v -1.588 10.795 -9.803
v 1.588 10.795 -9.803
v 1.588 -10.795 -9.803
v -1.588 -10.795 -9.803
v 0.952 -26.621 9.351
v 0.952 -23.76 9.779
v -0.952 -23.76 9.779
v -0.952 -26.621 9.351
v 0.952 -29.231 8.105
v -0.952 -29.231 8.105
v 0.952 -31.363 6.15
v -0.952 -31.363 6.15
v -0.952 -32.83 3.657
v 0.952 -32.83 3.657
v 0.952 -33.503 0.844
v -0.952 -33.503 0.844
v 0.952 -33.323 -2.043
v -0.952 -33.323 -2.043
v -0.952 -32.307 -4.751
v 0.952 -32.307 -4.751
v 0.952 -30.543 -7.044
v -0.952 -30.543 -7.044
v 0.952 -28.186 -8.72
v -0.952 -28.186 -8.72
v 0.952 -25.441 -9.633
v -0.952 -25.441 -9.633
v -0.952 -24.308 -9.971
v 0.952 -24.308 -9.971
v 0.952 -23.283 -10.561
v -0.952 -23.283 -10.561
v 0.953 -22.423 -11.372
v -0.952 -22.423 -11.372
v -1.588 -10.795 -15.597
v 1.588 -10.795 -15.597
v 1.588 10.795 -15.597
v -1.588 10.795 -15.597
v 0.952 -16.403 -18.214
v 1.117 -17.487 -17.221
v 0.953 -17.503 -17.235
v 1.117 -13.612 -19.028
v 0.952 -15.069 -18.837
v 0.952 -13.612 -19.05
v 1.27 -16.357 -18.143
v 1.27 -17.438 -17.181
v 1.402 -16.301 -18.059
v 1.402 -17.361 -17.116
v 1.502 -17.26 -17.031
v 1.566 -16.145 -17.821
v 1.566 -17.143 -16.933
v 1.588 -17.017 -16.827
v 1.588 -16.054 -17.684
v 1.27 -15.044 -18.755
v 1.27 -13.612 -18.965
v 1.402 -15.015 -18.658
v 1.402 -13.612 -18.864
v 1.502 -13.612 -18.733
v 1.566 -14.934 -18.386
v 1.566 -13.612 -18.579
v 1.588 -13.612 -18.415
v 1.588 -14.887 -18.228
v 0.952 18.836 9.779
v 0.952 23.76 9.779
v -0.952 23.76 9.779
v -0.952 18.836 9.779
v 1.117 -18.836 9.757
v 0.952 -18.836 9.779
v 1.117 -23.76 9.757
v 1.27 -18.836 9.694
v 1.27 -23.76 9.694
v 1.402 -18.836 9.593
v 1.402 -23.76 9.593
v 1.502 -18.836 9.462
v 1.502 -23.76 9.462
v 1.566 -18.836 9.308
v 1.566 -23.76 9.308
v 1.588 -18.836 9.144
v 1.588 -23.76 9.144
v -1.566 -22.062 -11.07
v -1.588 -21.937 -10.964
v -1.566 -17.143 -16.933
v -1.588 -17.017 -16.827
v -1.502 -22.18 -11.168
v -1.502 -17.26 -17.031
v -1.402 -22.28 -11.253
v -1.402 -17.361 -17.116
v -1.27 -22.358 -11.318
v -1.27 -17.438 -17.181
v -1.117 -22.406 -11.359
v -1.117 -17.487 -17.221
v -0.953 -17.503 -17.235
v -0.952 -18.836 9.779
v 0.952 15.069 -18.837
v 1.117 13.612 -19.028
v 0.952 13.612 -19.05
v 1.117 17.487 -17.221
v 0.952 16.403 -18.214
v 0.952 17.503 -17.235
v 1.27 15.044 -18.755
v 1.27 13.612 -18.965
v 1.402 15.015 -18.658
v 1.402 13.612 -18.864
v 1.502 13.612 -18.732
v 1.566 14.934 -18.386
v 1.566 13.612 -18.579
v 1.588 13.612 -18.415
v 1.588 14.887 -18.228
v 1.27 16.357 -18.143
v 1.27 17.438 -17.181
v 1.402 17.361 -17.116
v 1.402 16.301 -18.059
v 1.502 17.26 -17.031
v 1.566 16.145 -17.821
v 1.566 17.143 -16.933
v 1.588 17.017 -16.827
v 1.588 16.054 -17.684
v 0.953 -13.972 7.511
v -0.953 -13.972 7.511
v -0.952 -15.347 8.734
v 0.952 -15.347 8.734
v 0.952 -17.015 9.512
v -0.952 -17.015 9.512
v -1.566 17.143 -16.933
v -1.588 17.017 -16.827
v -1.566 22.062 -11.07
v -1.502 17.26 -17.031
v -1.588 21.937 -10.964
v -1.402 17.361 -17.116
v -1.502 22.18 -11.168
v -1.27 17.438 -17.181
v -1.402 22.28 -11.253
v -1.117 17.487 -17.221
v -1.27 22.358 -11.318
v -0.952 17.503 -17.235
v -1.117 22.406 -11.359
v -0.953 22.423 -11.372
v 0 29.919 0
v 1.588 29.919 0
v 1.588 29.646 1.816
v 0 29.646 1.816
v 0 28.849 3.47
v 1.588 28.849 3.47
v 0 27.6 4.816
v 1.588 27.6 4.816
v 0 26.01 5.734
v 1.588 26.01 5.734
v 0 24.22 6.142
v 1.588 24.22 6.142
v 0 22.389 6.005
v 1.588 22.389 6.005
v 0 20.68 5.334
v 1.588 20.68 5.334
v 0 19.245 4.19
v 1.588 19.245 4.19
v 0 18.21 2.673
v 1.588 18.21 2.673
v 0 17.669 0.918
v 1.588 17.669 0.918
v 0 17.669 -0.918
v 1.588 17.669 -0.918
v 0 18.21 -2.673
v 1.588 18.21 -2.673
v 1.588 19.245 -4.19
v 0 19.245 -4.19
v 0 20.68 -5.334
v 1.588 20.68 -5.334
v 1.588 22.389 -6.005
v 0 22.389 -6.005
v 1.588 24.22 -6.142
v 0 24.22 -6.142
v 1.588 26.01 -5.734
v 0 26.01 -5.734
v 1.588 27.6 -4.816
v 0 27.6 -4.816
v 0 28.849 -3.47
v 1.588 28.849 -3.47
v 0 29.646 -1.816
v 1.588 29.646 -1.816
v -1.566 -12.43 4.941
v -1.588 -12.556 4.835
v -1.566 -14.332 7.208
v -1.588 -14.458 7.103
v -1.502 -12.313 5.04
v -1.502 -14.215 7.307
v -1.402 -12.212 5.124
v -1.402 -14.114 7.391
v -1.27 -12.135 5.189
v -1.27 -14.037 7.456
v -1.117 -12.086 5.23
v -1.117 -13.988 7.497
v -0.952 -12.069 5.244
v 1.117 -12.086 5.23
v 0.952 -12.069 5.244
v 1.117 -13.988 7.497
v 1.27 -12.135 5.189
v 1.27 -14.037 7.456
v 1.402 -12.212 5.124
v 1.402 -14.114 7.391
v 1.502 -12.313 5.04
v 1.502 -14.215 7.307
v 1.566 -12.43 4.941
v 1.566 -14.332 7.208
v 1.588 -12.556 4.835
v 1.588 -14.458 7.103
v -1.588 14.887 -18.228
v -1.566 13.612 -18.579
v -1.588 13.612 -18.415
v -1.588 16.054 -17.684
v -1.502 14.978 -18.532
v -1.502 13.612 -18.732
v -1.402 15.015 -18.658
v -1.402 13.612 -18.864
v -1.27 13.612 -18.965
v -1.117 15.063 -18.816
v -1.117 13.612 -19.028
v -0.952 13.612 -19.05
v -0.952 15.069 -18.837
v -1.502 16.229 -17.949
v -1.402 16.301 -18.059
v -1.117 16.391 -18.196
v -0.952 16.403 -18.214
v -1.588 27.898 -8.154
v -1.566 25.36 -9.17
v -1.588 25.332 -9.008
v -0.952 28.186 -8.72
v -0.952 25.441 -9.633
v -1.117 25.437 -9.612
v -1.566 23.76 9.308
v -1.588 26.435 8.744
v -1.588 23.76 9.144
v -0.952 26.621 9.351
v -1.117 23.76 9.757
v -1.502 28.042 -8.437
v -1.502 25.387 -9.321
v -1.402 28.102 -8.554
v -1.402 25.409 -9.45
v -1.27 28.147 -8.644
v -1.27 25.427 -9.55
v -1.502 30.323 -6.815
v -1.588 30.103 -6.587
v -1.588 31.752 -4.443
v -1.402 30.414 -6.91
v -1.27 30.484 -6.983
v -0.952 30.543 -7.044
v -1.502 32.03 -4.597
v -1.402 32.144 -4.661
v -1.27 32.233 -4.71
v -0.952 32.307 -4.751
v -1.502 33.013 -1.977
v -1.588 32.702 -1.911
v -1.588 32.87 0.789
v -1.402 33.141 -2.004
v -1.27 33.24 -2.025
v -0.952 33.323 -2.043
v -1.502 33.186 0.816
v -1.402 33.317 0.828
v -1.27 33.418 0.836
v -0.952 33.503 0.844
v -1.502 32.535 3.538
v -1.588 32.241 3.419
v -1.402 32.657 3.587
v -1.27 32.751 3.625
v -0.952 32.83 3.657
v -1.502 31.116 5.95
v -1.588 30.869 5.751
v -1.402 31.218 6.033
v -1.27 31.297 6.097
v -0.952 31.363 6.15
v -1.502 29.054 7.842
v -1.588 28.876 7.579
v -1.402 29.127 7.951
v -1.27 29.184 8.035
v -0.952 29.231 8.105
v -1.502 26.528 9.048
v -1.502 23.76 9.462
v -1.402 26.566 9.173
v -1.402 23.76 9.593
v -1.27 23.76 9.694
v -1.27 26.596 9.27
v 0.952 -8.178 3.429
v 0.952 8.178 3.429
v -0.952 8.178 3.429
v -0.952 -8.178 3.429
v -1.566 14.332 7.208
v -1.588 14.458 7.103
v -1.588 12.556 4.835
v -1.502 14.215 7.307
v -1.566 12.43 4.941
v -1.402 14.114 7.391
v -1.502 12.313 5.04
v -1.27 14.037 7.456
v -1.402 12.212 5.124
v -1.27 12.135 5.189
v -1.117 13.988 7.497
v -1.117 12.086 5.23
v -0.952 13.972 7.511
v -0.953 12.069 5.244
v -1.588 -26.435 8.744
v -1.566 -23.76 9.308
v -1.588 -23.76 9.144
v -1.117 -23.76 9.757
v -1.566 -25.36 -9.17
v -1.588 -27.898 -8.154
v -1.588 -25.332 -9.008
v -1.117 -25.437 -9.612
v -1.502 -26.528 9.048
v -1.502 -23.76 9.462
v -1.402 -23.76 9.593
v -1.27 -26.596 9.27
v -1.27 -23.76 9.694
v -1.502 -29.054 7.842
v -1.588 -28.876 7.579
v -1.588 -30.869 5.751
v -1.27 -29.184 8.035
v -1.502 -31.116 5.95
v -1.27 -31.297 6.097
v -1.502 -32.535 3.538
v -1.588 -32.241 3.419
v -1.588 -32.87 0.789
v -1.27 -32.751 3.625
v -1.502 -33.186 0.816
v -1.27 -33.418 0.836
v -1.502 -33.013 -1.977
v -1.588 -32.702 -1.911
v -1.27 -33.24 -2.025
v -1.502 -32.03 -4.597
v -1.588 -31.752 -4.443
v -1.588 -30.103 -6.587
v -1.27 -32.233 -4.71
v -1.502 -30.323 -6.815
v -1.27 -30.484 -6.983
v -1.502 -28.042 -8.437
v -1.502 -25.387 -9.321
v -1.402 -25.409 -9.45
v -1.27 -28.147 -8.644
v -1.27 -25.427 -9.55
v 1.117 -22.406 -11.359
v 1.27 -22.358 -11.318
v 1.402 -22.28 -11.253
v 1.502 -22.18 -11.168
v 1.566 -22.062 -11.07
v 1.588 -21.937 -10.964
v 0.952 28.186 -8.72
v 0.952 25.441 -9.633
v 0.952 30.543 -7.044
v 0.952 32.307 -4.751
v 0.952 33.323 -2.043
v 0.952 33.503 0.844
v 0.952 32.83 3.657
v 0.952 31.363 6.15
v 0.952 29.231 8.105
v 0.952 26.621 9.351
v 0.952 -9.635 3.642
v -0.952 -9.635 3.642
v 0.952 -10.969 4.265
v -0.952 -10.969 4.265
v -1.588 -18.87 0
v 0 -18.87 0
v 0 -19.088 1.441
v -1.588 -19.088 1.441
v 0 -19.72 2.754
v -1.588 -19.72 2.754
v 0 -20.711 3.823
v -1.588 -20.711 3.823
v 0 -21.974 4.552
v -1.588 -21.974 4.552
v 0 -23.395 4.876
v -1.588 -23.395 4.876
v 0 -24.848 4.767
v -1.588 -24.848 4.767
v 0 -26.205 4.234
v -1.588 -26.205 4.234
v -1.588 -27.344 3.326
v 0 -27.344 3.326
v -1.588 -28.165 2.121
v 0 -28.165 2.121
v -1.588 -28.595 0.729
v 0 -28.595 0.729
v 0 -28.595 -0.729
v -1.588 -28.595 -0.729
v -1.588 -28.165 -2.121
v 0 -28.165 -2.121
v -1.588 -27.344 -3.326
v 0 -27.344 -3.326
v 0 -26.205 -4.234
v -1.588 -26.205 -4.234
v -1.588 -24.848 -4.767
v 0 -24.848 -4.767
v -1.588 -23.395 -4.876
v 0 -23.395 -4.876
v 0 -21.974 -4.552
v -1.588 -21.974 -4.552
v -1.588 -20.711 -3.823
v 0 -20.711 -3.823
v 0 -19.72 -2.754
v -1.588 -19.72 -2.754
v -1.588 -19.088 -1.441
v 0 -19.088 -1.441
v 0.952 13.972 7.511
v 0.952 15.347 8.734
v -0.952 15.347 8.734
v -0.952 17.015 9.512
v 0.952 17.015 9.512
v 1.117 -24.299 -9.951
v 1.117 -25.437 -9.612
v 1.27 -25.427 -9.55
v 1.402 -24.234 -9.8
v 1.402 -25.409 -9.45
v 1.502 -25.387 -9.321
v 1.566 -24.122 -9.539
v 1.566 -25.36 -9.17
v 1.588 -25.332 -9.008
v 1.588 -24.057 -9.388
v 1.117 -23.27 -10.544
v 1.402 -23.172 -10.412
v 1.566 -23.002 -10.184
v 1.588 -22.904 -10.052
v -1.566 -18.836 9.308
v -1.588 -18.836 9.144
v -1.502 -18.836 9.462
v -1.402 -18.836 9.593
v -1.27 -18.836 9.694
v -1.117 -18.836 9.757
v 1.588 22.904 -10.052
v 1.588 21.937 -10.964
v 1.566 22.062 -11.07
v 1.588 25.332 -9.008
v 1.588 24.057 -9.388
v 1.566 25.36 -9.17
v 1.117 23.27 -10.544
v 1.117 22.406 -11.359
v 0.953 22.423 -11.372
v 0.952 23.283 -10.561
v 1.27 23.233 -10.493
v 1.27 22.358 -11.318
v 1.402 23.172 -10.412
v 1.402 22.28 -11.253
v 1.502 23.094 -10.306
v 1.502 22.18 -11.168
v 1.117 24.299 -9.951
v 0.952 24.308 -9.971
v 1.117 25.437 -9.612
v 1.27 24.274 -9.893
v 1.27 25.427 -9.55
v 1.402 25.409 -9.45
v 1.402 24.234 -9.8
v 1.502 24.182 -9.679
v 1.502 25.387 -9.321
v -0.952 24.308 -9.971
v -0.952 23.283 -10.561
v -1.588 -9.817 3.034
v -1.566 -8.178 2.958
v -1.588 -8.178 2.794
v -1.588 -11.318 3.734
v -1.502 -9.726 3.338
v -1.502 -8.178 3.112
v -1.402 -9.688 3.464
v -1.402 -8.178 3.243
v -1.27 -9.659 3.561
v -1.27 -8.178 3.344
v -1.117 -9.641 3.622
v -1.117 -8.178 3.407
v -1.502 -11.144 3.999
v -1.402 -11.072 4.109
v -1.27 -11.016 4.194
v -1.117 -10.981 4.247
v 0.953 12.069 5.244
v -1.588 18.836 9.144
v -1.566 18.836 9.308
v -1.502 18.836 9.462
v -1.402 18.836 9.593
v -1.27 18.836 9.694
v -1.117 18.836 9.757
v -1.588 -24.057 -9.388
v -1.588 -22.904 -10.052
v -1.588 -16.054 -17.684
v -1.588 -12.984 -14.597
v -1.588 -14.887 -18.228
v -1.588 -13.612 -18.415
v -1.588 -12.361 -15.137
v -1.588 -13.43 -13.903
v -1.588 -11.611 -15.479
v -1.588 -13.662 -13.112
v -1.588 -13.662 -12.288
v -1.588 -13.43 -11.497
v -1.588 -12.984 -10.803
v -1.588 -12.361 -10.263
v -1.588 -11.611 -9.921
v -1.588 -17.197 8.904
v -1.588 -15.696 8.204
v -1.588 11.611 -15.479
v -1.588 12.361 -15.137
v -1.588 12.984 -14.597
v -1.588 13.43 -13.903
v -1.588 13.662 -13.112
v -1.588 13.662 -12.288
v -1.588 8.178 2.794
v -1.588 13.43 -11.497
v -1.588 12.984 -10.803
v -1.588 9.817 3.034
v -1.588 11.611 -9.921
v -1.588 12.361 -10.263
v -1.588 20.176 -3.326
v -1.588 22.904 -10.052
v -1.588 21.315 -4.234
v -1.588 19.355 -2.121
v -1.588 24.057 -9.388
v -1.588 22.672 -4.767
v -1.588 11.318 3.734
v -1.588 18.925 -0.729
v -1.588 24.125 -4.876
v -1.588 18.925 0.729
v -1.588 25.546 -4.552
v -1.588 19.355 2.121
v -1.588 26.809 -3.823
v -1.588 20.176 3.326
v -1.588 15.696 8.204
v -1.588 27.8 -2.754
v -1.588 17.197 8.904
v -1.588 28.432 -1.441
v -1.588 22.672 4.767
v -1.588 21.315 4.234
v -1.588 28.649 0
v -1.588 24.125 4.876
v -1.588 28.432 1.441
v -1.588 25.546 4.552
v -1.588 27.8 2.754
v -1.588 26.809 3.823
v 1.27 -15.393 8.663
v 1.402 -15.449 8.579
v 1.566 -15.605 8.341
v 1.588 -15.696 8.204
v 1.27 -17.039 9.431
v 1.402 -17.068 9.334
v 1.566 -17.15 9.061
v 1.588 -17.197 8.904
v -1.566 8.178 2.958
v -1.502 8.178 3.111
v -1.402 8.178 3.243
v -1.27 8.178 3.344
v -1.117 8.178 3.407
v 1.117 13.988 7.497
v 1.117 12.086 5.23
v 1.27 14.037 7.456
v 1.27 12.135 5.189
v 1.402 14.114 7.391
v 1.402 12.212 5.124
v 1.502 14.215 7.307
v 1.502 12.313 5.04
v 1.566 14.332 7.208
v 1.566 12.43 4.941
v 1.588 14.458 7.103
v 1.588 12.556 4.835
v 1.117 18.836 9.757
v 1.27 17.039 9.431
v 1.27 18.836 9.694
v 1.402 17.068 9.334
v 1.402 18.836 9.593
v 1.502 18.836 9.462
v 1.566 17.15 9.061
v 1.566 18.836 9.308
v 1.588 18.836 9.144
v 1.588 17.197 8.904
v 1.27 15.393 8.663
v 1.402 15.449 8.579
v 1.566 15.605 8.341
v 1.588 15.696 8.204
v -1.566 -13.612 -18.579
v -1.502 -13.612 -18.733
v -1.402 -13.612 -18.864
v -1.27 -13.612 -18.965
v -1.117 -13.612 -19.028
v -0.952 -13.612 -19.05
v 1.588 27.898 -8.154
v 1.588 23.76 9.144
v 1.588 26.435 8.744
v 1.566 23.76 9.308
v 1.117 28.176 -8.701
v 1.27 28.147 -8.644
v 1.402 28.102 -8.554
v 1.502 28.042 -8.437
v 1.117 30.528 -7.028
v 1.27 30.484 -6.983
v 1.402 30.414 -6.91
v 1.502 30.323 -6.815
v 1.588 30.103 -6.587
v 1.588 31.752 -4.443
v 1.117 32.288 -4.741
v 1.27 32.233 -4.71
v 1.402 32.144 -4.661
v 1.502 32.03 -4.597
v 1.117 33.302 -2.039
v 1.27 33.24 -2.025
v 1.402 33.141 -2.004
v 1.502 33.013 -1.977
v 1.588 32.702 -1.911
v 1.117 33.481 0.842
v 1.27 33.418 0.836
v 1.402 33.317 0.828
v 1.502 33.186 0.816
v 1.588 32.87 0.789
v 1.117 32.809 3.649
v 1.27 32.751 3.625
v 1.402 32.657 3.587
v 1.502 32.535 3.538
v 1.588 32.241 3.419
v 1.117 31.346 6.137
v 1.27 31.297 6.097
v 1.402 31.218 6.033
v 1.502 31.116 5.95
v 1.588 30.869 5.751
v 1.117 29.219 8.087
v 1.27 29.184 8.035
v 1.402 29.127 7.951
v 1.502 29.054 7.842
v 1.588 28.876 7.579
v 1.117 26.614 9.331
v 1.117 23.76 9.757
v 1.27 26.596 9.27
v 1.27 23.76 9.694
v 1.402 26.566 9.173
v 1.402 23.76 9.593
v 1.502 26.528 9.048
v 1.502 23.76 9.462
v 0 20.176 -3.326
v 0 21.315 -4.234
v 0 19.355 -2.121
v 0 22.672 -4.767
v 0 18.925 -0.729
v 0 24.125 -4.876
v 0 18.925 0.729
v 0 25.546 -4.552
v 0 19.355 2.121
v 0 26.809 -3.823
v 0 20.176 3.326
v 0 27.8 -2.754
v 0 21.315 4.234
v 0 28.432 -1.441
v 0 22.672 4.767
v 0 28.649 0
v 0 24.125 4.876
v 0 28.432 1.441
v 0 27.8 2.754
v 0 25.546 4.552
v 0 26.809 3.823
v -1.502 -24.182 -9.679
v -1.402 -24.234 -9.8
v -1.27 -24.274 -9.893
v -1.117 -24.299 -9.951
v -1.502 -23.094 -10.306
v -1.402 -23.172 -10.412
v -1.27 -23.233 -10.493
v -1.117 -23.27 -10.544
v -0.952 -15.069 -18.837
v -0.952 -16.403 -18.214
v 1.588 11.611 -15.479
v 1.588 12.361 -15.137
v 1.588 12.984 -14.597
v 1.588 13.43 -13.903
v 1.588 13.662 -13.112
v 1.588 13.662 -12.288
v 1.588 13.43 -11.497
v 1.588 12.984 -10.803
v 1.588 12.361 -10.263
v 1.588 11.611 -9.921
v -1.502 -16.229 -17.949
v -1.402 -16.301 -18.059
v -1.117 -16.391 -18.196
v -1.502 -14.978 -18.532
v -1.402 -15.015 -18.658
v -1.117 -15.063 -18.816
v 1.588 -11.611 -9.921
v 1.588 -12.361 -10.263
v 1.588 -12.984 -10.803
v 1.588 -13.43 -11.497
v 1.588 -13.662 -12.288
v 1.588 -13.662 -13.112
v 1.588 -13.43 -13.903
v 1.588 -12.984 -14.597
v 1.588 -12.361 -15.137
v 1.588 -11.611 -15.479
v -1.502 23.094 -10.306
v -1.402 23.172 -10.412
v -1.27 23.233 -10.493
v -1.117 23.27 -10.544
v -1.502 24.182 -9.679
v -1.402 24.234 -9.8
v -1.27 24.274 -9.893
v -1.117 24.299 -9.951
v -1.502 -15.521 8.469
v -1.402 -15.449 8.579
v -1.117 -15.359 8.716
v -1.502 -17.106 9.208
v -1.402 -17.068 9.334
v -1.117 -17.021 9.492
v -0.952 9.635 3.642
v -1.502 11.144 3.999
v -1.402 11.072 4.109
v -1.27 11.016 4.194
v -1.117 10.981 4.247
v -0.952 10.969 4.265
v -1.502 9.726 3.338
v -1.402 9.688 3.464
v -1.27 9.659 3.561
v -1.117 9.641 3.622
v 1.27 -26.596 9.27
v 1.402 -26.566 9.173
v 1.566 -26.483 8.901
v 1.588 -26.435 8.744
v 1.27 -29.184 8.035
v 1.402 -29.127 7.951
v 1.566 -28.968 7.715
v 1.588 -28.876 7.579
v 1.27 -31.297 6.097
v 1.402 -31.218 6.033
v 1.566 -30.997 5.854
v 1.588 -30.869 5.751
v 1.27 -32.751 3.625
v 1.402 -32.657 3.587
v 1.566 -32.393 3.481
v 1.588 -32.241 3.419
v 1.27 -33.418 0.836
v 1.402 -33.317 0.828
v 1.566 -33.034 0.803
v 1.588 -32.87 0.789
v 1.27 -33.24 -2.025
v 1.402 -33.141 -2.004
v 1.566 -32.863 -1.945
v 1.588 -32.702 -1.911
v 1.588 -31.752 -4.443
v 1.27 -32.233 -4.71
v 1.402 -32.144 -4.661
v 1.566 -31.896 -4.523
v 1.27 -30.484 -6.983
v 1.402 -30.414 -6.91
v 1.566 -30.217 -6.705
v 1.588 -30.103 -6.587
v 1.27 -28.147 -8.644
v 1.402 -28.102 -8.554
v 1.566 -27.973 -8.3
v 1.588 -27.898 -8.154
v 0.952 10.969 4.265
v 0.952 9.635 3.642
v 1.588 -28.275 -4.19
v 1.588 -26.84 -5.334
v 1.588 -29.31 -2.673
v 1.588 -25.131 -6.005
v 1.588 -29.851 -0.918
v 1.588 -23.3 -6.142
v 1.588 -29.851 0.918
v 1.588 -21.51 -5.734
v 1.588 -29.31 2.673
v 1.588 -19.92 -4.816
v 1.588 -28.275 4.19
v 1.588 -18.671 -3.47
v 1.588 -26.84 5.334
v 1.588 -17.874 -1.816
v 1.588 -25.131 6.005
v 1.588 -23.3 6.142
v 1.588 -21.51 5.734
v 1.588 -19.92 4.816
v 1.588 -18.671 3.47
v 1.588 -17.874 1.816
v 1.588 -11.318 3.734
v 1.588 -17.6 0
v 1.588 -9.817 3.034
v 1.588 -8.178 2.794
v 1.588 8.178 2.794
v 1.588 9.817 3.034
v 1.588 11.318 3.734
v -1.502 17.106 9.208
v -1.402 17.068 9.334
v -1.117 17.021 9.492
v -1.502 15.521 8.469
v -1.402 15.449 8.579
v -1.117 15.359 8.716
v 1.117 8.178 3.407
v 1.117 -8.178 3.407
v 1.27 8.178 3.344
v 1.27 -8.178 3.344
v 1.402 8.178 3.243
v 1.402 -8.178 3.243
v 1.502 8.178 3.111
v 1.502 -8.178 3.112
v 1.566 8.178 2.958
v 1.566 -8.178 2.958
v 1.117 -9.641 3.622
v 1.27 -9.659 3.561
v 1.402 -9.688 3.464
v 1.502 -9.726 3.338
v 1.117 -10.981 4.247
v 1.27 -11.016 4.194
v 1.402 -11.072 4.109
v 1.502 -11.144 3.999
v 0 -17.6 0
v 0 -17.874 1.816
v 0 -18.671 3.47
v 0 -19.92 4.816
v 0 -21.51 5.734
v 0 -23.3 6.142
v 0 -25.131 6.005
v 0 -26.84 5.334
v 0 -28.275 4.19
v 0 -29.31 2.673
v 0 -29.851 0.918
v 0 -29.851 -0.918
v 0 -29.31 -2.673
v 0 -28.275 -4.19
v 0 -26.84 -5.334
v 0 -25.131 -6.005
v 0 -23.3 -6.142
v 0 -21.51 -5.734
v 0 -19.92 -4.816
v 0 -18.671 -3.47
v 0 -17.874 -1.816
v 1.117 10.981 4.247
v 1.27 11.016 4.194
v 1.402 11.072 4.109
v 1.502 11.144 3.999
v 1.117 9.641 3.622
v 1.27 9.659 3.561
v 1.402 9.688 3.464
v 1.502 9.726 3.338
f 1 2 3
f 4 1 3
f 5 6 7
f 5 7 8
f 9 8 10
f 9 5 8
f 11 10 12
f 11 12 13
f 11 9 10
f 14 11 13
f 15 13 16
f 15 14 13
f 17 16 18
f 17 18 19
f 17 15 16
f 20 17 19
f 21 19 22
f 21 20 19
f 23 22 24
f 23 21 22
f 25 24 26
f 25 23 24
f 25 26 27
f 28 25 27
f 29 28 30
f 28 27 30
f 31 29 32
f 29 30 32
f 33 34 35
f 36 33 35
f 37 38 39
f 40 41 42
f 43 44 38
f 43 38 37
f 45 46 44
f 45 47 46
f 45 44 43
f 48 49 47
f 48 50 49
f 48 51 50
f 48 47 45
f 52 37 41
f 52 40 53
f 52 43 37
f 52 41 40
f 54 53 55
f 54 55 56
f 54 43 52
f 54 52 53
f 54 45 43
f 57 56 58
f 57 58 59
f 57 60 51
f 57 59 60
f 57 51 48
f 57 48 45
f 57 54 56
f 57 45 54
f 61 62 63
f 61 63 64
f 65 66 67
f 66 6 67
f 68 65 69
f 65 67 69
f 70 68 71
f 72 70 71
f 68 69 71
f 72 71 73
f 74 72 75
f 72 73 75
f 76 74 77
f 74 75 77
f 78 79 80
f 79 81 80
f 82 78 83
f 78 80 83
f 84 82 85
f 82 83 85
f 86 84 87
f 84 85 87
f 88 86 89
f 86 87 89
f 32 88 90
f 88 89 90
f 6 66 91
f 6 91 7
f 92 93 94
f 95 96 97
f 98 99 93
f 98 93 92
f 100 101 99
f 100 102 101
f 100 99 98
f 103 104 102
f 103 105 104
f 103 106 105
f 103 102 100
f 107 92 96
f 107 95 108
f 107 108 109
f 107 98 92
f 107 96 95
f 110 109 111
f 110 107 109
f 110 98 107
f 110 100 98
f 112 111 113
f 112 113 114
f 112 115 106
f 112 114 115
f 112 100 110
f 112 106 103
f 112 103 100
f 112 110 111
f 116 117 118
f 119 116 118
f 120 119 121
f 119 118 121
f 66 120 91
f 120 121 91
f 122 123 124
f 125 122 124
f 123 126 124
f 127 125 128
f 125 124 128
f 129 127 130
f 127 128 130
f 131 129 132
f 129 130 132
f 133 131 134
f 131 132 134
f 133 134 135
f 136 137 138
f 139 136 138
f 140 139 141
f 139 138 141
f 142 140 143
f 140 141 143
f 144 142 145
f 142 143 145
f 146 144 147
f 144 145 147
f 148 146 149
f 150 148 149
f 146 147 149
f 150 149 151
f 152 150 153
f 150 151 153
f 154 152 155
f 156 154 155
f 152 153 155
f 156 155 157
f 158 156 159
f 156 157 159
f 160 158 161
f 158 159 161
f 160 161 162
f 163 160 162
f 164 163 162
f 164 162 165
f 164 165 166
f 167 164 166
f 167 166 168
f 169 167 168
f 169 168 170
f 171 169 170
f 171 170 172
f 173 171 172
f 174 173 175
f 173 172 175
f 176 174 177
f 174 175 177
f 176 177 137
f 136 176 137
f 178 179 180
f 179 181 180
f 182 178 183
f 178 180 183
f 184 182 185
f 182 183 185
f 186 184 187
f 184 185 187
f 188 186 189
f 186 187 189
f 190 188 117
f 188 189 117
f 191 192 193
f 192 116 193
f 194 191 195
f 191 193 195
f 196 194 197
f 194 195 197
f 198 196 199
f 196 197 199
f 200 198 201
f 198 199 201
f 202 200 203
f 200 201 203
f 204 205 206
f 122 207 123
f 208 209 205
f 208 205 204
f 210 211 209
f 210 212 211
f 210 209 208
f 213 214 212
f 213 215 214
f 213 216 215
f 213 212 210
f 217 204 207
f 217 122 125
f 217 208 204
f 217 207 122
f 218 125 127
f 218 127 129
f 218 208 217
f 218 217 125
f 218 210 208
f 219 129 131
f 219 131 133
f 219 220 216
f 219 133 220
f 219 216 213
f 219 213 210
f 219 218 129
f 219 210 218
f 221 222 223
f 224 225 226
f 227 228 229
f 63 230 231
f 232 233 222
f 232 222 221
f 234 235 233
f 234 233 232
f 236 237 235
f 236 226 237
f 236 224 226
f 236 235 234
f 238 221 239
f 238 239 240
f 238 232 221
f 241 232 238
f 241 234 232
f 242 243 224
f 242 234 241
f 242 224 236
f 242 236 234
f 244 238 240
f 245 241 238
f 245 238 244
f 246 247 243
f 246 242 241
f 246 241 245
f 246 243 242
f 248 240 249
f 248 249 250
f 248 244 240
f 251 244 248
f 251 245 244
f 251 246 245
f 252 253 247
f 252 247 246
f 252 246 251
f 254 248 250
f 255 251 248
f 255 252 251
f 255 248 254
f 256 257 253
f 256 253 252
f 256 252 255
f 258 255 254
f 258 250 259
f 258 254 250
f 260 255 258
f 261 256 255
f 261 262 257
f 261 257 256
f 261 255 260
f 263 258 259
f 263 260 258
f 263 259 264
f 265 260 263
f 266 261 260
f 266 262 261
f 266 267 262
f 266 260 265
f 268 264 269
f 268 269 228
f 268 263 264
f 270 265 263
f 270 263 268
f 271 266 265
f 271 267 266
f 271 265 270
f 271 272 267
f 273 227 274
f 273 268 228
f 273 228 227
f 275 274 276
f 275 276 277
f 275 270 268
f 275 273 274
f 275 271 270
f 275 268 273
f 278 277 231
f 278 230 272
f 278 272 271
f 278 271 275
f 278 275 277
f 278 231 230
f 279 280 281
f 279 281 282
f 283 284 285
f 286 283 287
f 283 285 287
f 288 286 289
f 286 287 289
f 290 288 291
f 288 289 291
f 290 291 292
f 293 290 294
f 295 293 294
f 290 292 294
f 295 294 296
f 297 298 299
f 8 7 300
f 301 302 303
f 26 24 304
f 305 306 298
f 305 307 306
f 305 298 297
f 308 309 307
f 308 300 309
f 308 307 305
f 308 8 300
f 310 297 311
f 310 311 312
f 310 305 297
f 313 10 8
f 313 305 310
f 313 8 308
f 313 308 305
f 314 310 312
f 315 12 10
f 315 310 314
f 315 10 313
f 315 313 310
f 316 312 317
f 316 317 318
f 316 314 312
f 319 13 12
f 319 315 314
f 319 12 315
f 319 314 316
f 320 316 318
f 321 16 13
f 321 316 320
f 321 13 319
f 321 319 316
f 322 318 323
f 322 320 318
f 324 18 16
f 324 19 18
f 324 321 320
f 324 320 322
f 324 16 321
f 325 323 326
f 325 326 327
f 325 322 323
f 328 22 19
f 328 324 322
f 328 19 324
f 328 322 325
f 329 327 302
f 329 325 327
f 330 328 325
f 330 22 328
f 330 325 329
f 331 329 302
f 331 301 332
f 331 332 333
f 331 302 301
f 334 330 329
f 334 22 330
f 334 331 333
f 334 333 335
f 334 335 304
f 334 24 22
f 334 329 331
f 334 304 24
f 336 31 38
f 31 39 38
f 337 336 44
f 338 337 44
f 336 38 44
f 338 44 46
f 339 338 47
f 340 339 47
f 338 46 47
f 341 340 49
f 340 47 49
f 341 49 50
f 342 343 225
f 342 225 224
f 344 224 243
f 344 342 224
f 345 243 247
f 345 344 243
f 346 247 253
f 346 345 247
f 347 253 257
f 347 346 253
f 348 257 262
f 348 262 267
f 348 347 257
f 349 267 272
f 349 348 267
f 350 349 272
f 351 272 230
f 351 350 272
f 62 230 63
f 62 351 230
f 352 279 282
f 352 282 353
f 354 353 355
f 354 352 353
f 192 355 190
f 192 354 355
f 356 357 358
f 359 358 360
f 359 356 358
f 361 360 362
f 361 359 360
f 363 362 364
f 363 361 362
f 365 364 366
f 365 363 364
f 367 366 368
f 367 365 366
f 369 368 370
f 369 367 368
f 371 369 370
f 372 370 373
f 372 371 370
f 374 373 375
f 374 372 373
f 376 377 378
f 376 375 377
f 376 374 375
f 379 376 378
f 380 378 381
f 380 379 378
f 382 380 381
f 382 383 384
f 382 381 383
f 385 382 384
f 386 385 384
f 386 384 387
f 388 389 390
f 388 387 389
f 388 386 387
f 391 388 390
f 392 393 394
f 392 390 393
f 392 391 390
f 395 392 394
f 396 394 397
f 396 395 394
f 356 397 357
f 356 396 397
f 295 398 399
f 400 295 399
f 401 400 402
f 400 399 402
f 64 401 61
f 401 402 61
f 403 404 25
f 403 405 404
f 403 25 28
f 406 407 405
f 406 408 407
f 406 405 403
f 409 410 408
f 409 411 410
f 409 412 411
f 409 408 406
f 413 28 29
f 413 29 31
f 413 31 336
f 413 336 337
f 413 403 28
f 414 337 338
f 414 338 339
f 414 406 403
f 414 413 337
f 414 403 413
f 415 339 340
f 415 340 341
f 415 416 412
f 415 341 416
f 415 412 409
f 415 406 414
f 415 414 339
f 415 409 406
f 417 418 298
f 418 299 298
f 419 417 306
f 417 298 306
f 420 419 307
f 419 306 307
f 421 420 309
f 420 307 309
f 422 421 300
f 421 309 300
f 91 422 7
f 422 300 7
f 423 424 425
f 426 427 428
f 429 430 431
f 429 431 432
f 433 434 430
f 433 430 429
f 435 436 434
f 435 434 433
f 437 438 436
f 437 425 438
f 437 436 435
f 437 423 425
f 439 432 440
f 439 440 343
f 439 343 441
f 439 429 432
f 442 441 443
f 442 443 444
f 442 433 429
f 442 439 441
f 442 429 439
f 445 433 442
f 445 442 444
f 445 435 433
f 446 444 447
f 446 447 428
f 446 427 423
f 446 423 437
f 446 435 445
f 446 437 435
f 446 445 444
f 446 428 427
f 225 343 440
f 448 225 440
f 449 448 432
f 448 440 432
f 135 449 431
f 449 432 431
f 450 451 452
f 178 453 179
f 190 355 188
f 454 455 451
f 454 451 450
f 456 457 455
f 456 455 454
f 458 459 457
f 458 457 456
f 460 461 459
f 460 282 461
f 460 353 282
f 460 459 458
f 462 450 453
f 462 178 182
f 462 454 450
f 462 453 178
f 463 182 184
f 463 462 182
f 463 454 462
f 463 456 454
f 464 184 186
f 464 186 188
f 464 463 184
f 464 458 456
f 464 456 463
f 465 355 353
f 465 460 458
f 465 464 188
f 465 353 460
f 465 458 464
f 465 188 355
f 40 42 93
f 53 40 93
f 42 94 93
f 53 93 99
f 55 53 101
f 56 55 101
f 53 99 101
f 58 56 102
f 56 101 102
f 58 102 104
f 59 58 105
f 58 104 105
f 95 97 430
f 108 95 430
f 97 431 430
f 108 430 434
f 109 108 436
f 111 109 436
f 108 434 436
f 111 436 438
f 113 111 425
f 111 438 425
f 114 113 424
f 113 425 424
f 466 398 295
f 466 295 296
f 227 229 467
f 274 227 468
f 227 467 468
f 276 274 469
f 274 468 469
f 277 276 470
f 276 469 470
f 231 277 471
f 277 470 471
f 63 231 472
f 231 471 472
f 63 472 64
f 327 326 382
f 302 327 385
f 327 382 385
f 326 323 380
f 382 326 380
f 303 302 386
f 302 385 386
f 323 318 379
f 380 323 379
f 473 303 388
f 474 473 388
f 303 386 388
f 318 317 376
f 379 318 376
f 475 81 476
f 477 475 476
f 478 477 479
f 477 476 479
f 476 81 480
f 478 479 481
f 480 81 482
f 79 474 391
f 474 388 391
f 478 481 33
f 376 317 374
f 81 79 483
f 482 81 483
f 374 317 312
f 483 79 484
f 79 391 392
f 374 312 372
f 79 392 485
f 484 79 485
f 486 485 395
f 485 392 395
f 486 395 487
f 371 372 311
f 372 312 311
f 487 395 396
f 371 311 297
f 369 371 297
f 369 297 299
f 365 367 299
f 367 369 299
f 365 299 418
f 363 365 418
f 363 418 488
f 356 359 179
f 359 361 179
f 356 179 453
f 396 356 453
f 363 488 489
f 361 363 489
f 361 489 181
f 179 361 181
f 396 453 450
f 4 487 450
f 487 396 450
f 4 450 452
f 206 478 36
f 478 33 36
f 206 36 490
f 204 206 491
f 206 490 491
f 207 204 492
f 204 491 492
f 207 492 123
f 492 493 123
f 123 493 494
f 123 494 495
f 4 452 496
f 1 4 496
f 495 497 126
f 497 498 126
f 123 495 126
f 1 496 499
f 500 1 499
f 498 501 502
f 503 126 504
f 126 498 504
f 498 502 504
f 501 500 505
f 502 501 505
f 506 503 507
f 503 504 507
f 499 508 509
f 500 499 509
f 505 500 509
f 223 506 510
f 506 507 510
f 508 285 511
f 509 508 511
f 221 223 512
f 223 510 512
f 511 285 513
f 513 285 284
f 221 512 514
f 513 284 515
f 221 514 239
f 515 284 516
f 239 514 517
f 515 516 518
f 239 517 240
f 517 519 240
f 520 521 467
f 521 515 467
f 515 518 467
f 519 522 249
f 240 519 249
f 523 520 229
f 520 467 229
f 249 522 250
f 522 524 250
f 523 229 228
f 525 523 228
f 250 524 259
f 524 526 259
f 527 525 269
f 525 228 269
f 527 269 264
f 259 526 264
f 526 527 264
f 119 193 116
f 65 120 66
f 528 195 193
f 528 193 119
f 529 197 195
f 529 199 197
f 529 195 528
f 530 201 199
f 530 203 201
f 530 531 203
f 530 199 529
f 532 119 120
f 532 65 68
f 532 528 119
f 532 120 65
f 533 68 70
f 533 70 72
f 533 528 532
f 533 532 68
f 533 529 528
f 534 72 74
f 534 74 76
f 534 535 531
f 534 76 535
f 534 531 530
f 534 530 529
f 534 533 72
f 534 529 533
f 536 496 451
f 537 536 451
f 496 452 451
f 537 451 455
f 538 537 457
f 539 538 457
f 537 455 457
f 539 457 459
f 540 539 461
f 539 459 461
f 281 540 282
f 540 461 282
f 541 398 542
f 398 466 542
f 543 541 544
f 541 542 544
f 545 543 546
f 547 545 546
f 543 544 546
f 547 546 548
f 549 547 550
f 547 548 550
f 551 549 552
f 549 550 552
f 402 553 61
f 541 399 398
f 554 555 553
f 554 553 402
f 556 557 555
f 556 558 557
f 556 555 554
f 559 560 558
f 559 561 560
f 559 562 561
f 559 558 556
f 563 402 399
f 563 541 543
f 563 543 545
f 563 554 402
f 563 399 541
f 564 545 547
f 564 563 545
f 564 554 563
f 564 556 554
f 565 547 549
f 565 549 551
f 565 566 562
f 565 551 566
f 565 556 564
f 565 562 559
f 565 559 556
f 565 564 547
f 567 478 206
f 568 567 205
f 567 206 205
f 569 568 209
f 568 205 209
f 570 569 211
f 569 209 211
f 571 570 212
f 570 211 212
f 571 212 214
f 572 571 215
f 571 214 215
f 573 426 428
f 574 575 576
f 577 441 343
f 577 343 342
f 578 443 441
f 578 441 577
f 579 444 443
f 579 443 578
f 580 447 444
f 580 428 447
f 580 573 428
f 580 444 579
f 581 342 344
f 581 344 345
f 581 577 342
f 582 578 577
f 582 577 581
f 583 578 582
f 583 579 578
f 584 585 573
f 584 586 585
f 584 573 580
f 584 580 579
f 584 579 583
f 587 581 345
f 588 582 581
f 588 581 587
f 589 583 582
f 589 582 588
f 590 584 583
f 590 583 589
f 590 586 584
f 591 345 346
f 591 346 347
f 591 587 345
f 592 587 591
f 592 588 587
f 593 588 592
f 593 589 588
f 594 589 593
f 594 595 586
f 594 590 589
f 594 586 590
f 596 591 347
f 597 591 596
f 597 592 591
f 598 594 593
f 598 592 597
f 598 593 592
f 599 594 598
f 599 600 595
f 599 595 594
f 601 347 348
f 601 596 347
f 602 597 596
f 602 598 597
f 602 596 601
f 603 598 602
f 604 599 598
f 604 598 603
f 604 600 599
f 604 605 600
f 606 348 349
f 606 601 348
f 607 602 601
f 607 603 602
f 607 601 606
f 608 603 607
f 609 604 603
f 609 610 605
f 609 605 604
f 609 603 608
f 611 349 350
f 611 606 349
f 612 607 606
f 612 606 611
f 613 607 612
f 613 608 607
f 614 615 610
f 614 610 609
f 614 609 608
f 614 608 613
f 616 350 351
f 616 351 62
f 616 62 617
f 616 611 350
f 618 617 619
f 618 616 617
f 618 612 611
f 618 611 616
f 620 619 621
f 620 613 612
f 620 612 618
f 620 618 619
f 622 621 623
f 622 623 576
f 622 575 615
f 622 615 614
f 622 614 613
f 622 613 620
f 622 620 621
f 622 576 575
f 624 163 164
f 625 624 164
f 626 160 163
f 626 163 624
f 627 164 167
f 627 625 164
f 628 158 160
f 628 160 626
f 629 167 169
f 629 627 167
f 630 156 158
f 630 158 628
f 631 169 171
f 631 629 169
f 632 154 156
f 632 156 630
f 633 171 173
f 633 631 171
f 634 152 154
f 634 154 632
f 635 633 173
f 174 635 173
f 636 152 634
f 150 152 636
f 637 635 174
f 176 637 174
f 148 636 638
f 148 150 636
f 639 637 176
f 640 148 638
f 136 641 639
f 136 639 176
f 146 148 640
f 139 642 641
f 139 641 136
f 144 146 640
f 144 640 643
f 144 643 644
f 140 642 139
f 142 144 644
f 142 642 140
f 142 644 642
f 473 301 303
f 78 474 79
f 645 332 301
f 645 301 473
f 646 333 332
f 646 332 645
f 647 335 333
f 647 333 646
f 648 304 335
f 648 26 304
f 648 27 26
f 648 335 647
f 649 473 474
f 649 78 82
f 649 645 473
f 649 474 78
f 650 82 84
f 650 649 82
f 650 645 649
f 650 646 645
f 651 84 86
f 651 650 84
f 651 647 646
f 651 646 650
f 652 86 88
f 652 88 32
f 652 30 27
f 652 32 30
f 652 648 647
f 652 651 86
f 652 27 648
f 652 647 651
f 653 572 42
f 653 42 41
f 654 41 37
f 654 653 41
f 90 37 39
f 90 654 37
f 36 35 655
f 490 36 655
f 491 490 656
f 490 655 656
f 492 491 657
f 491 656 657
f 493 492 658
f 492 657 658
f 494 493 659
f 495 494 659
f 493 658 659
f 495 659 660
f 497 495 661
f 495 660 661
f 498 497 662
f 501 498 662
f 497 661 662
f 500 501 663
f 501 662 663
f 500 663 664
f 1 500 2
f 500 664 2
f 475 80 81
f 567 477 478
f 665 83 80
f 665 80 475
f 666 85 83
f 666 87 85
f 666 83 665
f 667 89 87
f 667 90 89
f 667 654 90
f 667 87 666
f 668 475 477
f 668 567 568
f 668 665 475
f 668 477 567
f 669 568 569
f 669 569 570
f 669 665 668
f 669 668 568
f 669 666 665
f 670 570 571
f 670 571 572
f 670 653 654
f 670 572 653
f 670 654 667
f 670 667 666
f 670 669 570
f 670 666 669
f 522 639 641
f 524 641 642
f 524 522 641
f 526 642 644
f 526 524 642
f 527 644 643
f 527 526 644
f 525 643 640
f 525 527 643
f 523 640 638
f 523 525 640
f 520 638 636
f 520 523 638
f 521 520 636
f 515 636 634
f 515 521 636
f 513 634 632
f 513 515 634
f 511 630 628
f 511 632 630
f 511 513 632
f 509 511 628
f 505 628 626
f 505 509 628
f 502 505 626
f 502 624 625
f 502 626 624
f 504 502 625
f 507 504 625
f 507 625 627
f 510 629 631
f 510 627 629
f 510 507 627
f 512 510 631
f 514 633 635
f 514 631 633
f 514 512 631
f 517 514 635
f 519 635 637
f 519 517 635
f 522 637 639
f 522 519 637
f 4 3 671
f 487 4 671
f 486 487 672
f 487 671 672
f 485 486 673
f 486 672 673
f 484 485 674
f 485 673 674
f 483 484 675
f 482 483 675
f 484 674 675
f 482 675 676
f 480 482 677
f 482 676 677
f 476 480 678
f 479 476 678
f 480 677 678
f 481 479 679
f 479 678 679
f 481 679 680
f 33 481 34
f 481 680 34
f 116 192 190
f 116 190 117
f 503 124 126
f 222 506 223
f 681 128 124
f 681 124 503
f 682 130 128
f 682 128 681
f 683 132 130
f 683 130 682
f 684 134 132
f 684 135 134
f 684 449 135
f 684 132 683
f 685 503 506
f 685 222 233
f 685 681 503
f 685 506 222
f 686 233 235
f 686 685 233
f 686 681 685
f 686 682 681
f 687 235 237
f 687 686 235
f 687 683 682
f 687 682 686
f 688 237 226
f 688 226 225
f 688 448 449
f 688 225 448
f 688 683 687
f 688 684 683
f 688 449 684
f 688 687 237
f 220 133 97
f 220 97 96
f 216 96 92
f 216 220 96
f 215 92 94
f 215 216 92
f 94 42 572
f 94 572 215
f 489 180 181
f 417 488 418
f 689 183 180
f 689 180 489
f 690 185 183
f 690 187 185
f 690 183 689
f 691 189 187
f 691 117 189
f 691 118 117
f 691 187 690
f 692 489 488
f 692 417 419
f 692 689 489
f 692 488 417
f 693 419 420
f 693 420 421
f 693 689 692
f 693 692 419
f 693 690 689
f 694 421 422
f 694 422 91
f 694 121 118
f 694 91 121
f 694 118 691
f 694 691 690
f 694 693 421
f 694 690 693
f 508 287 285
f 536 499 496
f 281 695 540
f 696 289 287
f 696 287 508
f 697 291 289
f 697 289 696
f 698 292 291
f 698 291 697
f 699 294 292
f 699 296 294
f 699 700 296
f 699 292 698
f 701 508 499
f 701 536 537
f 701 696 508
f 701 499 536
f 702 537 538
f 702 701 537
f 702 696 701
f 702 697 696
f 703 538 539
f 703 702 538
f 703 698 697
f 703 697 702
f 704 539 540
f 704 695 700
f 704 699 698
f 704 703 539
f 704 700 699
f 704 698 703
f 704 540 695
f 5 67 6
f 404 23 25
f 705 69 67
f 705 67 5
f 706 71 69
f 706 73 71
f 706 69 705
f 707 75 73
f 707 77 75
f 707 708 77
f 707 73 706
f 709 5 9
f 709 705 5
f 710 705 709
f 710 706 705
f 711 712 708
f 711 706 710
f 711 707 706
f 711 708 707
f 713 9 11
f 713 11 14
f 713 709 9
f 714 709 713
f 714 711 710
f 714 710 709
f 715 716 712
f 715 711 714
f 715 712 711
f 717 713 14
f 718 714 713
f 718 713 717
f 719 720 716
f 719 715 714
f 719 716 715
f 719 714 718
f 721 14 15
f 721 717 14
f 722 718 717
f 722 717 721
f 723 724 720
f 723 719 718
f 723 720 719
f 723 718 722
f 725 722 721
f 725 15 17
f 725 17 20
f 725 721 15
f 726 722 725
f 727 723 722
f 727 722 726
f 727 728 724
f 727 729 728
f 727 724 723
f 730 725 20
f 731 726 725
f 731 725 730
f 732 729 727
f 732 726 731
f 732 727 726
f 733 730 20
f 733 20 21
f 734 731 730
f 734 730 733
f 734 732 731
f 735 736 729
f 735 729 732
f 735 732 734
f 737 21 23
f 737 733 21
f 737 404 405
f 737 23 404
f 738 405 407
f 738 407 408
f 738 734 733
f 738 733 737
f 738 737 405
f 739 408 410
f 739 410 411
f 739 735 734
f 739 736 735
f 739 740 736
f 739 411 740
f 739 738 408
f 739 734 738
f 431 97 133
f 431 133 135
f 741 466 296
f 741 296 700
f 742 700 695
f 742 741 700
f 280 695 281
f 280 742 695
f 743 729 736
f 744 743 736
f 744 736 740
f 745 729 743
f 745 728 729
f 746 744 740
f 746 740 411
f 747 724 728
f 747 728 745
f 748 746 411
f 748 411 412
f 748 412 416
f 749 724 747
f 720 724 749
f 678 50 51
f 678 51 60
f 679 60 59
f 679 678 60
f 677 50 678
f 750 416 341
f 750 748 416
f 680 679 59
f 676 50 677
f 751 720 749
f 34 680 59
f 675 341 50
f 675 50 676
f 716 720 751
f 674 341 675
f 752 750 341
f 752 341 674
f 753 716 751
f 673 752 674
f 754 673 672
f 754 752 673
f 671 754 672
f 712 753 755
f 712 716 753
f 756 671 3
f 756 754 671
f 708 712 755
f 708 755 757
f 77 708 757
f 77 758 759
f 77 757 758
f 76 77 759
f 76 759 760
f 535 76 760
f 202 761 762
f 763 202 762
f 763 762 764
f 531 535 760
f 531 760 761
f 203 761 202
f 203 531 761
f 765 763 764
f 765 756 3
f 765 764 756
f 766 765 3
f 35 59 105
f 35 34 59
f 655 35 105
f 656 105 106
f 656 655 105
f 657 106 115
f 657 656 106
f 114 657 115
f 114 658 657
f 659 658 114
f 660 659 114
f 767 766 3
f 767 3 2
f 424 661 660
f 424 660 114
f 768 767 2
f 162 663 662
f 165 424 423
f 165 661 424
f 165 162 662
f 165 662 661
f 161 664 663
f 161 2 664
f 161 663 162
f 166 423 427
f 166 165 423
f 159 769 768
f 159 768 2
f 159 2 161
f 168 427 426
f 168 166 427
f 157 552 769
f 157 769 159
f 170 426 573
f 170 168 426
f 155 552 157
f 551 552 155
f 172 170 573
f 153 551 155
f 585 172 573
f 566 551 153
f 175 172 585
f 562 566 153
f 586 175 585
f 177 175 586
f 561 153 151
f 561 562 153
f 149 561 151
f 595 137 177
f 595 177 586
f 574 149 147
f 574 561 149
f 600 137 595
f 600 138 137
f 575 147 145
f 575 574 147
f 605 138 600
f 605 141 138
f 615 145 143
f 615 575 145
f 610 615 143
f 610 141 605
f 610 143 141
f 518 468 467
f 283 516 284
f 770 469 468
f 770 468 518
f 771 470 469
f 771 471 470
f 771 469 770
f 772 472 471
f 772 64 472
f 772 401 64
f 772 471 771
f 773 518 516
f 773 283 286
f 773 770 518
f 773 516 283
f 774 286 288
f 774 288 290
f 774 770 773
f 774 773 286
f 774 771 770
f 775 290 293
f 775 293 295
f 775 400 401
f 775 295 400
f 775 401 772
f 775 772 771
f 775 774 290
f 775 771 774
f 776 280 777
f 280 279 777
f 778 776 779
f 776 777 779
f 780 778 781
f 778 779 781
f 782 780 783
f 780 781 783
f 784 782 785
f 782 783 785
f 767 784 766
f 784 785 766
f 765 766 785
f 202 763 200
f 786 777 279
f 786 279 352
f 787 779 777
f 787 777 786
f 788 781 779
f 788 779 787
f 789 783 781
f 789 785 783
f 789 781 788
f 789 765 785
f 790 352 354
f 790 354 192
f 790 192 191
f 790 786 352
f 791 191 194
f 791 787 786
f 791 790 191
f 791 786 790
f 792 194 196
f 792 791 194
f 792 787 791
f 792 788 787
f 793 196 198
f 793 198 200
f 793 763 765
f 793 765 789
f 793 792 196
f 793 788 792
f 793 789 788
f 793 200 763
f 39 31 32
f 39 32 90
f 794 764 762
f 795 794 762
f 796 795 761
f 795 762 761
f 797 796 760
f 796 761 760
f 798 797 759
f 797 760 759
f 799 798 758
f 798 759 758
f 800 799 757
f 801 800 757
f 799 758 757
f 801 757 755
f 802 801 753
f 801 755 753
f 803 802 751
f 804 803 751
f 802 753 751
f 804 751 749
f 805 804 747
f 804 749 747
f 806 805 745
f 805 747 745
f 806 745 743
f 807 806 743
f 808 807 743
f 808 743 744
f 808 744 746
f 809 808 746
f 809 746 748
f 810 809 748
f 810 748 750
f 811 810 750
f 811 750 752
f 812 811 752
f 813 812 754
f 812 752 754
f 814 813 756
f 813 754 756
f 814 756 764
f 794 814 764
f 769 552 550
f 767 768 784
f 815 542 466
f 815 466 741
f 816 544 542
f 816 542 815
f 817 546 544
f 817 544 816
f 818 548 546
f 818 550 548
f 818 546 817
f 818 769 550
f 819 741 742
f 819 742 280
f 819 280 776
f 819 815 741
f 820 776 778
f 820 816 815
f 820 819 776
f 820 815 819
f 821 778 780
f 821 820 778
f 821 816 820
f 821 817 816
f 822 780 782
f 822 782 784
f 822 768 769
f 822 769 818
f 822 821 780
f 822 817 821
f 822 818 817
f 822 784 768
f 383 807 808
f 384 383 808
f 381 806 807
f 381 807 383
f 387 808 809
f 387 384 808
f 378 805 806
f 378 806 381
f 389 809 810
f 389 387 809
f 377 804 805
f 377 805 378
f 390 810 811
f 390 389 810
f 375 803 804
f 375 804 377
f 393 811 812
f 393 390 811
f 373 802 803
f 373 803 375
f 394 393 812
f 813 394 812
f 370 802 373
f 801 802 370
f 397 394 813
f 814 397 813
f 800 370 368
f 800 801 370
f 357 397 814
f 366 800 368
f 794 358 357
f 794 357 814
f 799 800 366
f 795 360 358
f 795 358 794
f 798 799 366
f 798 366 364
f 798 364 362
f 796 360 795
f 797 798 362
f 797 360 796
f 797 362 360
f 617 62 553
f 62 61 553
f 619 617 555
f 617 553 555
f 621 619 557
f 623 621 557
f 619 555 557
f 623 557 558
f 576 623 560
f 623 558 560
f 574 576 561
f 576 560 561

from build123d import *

# Parameters (mm, degrees)
F0_R     = 4.8895
F1_DEPTH = 1.5875
F2_R     = 5.08
F3_R     = 5.08
F4_R     = 6.35
F5_R     = 5.08
F7_DEPTH = 12.7
F8_R     = 6.1595
F9_DEPTH = 1.5875
F10_R    = 0.635


with BuildPart() as f1:
    # F0 (on Right) → F1 (new body, symmetric)
    with BuildSketch(Plane.YZ):
        with BuildLine():
            Line((15.980706, -19.05), (23.759998, -9.779))
            ThreePointArc((23.759998, -9.779), (33.538998, 0), (23.759998, 9.779))
            Line((23.759998, 9.779), (15.875, 9.779))
            Line((15.875, 9.779), (10.546717, 3.429))
            Line((10.546717, 3.429), (-10.546717, 3.429))
            Line((-10.546717, 3.429), (-15.875, 9.779))
            Line((-15.875, 9.779), (-23.759998, 9.779))
            ThreePointArc((-23.759998, 9.779), (-33.538998, 0), (-23.759998, -9.779))
            Line((-23.759998, -9.779), (-15.980706, -19.05))
            Line((-15.980706, -19.05), (15.980706, -19.05))
        make_face()
        with Locations((-23.759998, 0)):
            Circle(F0_R, mode=Mode.SUBTRACT)
        with Locations((23.759998, 0)):
            Circle(F0_R, mode=Mode.SUBTRACT)
    extrude(amount=F1_DEPTH, both=True)

    # F2
    f2_edges = [f1.edges().sort_by_distance(p)[0] for p in [
        (0, -15.980706, -19.05),
        (0, 15.980706, -19.05),
    ]]
    fillet(f2_edges, radius=F2_R)

    # F3
    f3_edges = [f1.edges().sort_by_distance(p)[0] for p in [
        (0, -10.546717, 3.429),
        (0, 10.546717, 3.429),
    ]]
    fillet(f3_edges, radius=F3_R)

    # F4
    f4_edges = [f1.edges().sort_by_distance(p)[0] for p in [
        (0, -15.875, 9.779),
        (0, 15.875, 9.779),
    ]]
    fillet(f4_edges, radius=F4_R)

    # F5
    f5_edges = [f1.edges().sort_by_distance(p)[0] for p in [
        (0, -23.759998, -9.779),
        (0, 23.759998, -9.779),
    ]]
    fillet(f5_edges, radius=F5_R)

    # F6 (on Right) → F7 (cut, symmetric)
    with BuildSketch(Plane.YZ):
        with BuildLine():
            Line((10.795, -9.803238), (-10.795, -9.803238))
            ThreePointArc((-10.795, -9.803238), (-13.691762, -12.7), (-10.795, -15.596762))
            Line((-10.795, -15.596762), (10.795, -15.596762))
            ThreePointArc((10.795, -15.596762), (13.691762, -12.7), (10.795, -9.803238))
        make_face()
    extrude(amount=F7_DEPTH, both=True, mode=Mode.SUBTRACT)

    # F8 (on face) → F9 (cut)
    with BuildSketch(Plane.YZ.offset(1.5875)):
        with Locations((-23.759998, 0)):
            Circle(F8_R)
        with Locations((23.759998, 0)):
            Circle(F8_R)
    extrude(amount=-F9_DEPTH, mode=Mode.SUBTRACT)

    # F10
    f10_edges = [f1.edges().sort_by_distance(p)[0] for p in [
        (1.5875, -19.963165, -14.303889),
        (-1.5875, -33.502533, 0.84372),
    ]]
    fillet(f10_edges, radius=F10_R)


solid = f1.part
